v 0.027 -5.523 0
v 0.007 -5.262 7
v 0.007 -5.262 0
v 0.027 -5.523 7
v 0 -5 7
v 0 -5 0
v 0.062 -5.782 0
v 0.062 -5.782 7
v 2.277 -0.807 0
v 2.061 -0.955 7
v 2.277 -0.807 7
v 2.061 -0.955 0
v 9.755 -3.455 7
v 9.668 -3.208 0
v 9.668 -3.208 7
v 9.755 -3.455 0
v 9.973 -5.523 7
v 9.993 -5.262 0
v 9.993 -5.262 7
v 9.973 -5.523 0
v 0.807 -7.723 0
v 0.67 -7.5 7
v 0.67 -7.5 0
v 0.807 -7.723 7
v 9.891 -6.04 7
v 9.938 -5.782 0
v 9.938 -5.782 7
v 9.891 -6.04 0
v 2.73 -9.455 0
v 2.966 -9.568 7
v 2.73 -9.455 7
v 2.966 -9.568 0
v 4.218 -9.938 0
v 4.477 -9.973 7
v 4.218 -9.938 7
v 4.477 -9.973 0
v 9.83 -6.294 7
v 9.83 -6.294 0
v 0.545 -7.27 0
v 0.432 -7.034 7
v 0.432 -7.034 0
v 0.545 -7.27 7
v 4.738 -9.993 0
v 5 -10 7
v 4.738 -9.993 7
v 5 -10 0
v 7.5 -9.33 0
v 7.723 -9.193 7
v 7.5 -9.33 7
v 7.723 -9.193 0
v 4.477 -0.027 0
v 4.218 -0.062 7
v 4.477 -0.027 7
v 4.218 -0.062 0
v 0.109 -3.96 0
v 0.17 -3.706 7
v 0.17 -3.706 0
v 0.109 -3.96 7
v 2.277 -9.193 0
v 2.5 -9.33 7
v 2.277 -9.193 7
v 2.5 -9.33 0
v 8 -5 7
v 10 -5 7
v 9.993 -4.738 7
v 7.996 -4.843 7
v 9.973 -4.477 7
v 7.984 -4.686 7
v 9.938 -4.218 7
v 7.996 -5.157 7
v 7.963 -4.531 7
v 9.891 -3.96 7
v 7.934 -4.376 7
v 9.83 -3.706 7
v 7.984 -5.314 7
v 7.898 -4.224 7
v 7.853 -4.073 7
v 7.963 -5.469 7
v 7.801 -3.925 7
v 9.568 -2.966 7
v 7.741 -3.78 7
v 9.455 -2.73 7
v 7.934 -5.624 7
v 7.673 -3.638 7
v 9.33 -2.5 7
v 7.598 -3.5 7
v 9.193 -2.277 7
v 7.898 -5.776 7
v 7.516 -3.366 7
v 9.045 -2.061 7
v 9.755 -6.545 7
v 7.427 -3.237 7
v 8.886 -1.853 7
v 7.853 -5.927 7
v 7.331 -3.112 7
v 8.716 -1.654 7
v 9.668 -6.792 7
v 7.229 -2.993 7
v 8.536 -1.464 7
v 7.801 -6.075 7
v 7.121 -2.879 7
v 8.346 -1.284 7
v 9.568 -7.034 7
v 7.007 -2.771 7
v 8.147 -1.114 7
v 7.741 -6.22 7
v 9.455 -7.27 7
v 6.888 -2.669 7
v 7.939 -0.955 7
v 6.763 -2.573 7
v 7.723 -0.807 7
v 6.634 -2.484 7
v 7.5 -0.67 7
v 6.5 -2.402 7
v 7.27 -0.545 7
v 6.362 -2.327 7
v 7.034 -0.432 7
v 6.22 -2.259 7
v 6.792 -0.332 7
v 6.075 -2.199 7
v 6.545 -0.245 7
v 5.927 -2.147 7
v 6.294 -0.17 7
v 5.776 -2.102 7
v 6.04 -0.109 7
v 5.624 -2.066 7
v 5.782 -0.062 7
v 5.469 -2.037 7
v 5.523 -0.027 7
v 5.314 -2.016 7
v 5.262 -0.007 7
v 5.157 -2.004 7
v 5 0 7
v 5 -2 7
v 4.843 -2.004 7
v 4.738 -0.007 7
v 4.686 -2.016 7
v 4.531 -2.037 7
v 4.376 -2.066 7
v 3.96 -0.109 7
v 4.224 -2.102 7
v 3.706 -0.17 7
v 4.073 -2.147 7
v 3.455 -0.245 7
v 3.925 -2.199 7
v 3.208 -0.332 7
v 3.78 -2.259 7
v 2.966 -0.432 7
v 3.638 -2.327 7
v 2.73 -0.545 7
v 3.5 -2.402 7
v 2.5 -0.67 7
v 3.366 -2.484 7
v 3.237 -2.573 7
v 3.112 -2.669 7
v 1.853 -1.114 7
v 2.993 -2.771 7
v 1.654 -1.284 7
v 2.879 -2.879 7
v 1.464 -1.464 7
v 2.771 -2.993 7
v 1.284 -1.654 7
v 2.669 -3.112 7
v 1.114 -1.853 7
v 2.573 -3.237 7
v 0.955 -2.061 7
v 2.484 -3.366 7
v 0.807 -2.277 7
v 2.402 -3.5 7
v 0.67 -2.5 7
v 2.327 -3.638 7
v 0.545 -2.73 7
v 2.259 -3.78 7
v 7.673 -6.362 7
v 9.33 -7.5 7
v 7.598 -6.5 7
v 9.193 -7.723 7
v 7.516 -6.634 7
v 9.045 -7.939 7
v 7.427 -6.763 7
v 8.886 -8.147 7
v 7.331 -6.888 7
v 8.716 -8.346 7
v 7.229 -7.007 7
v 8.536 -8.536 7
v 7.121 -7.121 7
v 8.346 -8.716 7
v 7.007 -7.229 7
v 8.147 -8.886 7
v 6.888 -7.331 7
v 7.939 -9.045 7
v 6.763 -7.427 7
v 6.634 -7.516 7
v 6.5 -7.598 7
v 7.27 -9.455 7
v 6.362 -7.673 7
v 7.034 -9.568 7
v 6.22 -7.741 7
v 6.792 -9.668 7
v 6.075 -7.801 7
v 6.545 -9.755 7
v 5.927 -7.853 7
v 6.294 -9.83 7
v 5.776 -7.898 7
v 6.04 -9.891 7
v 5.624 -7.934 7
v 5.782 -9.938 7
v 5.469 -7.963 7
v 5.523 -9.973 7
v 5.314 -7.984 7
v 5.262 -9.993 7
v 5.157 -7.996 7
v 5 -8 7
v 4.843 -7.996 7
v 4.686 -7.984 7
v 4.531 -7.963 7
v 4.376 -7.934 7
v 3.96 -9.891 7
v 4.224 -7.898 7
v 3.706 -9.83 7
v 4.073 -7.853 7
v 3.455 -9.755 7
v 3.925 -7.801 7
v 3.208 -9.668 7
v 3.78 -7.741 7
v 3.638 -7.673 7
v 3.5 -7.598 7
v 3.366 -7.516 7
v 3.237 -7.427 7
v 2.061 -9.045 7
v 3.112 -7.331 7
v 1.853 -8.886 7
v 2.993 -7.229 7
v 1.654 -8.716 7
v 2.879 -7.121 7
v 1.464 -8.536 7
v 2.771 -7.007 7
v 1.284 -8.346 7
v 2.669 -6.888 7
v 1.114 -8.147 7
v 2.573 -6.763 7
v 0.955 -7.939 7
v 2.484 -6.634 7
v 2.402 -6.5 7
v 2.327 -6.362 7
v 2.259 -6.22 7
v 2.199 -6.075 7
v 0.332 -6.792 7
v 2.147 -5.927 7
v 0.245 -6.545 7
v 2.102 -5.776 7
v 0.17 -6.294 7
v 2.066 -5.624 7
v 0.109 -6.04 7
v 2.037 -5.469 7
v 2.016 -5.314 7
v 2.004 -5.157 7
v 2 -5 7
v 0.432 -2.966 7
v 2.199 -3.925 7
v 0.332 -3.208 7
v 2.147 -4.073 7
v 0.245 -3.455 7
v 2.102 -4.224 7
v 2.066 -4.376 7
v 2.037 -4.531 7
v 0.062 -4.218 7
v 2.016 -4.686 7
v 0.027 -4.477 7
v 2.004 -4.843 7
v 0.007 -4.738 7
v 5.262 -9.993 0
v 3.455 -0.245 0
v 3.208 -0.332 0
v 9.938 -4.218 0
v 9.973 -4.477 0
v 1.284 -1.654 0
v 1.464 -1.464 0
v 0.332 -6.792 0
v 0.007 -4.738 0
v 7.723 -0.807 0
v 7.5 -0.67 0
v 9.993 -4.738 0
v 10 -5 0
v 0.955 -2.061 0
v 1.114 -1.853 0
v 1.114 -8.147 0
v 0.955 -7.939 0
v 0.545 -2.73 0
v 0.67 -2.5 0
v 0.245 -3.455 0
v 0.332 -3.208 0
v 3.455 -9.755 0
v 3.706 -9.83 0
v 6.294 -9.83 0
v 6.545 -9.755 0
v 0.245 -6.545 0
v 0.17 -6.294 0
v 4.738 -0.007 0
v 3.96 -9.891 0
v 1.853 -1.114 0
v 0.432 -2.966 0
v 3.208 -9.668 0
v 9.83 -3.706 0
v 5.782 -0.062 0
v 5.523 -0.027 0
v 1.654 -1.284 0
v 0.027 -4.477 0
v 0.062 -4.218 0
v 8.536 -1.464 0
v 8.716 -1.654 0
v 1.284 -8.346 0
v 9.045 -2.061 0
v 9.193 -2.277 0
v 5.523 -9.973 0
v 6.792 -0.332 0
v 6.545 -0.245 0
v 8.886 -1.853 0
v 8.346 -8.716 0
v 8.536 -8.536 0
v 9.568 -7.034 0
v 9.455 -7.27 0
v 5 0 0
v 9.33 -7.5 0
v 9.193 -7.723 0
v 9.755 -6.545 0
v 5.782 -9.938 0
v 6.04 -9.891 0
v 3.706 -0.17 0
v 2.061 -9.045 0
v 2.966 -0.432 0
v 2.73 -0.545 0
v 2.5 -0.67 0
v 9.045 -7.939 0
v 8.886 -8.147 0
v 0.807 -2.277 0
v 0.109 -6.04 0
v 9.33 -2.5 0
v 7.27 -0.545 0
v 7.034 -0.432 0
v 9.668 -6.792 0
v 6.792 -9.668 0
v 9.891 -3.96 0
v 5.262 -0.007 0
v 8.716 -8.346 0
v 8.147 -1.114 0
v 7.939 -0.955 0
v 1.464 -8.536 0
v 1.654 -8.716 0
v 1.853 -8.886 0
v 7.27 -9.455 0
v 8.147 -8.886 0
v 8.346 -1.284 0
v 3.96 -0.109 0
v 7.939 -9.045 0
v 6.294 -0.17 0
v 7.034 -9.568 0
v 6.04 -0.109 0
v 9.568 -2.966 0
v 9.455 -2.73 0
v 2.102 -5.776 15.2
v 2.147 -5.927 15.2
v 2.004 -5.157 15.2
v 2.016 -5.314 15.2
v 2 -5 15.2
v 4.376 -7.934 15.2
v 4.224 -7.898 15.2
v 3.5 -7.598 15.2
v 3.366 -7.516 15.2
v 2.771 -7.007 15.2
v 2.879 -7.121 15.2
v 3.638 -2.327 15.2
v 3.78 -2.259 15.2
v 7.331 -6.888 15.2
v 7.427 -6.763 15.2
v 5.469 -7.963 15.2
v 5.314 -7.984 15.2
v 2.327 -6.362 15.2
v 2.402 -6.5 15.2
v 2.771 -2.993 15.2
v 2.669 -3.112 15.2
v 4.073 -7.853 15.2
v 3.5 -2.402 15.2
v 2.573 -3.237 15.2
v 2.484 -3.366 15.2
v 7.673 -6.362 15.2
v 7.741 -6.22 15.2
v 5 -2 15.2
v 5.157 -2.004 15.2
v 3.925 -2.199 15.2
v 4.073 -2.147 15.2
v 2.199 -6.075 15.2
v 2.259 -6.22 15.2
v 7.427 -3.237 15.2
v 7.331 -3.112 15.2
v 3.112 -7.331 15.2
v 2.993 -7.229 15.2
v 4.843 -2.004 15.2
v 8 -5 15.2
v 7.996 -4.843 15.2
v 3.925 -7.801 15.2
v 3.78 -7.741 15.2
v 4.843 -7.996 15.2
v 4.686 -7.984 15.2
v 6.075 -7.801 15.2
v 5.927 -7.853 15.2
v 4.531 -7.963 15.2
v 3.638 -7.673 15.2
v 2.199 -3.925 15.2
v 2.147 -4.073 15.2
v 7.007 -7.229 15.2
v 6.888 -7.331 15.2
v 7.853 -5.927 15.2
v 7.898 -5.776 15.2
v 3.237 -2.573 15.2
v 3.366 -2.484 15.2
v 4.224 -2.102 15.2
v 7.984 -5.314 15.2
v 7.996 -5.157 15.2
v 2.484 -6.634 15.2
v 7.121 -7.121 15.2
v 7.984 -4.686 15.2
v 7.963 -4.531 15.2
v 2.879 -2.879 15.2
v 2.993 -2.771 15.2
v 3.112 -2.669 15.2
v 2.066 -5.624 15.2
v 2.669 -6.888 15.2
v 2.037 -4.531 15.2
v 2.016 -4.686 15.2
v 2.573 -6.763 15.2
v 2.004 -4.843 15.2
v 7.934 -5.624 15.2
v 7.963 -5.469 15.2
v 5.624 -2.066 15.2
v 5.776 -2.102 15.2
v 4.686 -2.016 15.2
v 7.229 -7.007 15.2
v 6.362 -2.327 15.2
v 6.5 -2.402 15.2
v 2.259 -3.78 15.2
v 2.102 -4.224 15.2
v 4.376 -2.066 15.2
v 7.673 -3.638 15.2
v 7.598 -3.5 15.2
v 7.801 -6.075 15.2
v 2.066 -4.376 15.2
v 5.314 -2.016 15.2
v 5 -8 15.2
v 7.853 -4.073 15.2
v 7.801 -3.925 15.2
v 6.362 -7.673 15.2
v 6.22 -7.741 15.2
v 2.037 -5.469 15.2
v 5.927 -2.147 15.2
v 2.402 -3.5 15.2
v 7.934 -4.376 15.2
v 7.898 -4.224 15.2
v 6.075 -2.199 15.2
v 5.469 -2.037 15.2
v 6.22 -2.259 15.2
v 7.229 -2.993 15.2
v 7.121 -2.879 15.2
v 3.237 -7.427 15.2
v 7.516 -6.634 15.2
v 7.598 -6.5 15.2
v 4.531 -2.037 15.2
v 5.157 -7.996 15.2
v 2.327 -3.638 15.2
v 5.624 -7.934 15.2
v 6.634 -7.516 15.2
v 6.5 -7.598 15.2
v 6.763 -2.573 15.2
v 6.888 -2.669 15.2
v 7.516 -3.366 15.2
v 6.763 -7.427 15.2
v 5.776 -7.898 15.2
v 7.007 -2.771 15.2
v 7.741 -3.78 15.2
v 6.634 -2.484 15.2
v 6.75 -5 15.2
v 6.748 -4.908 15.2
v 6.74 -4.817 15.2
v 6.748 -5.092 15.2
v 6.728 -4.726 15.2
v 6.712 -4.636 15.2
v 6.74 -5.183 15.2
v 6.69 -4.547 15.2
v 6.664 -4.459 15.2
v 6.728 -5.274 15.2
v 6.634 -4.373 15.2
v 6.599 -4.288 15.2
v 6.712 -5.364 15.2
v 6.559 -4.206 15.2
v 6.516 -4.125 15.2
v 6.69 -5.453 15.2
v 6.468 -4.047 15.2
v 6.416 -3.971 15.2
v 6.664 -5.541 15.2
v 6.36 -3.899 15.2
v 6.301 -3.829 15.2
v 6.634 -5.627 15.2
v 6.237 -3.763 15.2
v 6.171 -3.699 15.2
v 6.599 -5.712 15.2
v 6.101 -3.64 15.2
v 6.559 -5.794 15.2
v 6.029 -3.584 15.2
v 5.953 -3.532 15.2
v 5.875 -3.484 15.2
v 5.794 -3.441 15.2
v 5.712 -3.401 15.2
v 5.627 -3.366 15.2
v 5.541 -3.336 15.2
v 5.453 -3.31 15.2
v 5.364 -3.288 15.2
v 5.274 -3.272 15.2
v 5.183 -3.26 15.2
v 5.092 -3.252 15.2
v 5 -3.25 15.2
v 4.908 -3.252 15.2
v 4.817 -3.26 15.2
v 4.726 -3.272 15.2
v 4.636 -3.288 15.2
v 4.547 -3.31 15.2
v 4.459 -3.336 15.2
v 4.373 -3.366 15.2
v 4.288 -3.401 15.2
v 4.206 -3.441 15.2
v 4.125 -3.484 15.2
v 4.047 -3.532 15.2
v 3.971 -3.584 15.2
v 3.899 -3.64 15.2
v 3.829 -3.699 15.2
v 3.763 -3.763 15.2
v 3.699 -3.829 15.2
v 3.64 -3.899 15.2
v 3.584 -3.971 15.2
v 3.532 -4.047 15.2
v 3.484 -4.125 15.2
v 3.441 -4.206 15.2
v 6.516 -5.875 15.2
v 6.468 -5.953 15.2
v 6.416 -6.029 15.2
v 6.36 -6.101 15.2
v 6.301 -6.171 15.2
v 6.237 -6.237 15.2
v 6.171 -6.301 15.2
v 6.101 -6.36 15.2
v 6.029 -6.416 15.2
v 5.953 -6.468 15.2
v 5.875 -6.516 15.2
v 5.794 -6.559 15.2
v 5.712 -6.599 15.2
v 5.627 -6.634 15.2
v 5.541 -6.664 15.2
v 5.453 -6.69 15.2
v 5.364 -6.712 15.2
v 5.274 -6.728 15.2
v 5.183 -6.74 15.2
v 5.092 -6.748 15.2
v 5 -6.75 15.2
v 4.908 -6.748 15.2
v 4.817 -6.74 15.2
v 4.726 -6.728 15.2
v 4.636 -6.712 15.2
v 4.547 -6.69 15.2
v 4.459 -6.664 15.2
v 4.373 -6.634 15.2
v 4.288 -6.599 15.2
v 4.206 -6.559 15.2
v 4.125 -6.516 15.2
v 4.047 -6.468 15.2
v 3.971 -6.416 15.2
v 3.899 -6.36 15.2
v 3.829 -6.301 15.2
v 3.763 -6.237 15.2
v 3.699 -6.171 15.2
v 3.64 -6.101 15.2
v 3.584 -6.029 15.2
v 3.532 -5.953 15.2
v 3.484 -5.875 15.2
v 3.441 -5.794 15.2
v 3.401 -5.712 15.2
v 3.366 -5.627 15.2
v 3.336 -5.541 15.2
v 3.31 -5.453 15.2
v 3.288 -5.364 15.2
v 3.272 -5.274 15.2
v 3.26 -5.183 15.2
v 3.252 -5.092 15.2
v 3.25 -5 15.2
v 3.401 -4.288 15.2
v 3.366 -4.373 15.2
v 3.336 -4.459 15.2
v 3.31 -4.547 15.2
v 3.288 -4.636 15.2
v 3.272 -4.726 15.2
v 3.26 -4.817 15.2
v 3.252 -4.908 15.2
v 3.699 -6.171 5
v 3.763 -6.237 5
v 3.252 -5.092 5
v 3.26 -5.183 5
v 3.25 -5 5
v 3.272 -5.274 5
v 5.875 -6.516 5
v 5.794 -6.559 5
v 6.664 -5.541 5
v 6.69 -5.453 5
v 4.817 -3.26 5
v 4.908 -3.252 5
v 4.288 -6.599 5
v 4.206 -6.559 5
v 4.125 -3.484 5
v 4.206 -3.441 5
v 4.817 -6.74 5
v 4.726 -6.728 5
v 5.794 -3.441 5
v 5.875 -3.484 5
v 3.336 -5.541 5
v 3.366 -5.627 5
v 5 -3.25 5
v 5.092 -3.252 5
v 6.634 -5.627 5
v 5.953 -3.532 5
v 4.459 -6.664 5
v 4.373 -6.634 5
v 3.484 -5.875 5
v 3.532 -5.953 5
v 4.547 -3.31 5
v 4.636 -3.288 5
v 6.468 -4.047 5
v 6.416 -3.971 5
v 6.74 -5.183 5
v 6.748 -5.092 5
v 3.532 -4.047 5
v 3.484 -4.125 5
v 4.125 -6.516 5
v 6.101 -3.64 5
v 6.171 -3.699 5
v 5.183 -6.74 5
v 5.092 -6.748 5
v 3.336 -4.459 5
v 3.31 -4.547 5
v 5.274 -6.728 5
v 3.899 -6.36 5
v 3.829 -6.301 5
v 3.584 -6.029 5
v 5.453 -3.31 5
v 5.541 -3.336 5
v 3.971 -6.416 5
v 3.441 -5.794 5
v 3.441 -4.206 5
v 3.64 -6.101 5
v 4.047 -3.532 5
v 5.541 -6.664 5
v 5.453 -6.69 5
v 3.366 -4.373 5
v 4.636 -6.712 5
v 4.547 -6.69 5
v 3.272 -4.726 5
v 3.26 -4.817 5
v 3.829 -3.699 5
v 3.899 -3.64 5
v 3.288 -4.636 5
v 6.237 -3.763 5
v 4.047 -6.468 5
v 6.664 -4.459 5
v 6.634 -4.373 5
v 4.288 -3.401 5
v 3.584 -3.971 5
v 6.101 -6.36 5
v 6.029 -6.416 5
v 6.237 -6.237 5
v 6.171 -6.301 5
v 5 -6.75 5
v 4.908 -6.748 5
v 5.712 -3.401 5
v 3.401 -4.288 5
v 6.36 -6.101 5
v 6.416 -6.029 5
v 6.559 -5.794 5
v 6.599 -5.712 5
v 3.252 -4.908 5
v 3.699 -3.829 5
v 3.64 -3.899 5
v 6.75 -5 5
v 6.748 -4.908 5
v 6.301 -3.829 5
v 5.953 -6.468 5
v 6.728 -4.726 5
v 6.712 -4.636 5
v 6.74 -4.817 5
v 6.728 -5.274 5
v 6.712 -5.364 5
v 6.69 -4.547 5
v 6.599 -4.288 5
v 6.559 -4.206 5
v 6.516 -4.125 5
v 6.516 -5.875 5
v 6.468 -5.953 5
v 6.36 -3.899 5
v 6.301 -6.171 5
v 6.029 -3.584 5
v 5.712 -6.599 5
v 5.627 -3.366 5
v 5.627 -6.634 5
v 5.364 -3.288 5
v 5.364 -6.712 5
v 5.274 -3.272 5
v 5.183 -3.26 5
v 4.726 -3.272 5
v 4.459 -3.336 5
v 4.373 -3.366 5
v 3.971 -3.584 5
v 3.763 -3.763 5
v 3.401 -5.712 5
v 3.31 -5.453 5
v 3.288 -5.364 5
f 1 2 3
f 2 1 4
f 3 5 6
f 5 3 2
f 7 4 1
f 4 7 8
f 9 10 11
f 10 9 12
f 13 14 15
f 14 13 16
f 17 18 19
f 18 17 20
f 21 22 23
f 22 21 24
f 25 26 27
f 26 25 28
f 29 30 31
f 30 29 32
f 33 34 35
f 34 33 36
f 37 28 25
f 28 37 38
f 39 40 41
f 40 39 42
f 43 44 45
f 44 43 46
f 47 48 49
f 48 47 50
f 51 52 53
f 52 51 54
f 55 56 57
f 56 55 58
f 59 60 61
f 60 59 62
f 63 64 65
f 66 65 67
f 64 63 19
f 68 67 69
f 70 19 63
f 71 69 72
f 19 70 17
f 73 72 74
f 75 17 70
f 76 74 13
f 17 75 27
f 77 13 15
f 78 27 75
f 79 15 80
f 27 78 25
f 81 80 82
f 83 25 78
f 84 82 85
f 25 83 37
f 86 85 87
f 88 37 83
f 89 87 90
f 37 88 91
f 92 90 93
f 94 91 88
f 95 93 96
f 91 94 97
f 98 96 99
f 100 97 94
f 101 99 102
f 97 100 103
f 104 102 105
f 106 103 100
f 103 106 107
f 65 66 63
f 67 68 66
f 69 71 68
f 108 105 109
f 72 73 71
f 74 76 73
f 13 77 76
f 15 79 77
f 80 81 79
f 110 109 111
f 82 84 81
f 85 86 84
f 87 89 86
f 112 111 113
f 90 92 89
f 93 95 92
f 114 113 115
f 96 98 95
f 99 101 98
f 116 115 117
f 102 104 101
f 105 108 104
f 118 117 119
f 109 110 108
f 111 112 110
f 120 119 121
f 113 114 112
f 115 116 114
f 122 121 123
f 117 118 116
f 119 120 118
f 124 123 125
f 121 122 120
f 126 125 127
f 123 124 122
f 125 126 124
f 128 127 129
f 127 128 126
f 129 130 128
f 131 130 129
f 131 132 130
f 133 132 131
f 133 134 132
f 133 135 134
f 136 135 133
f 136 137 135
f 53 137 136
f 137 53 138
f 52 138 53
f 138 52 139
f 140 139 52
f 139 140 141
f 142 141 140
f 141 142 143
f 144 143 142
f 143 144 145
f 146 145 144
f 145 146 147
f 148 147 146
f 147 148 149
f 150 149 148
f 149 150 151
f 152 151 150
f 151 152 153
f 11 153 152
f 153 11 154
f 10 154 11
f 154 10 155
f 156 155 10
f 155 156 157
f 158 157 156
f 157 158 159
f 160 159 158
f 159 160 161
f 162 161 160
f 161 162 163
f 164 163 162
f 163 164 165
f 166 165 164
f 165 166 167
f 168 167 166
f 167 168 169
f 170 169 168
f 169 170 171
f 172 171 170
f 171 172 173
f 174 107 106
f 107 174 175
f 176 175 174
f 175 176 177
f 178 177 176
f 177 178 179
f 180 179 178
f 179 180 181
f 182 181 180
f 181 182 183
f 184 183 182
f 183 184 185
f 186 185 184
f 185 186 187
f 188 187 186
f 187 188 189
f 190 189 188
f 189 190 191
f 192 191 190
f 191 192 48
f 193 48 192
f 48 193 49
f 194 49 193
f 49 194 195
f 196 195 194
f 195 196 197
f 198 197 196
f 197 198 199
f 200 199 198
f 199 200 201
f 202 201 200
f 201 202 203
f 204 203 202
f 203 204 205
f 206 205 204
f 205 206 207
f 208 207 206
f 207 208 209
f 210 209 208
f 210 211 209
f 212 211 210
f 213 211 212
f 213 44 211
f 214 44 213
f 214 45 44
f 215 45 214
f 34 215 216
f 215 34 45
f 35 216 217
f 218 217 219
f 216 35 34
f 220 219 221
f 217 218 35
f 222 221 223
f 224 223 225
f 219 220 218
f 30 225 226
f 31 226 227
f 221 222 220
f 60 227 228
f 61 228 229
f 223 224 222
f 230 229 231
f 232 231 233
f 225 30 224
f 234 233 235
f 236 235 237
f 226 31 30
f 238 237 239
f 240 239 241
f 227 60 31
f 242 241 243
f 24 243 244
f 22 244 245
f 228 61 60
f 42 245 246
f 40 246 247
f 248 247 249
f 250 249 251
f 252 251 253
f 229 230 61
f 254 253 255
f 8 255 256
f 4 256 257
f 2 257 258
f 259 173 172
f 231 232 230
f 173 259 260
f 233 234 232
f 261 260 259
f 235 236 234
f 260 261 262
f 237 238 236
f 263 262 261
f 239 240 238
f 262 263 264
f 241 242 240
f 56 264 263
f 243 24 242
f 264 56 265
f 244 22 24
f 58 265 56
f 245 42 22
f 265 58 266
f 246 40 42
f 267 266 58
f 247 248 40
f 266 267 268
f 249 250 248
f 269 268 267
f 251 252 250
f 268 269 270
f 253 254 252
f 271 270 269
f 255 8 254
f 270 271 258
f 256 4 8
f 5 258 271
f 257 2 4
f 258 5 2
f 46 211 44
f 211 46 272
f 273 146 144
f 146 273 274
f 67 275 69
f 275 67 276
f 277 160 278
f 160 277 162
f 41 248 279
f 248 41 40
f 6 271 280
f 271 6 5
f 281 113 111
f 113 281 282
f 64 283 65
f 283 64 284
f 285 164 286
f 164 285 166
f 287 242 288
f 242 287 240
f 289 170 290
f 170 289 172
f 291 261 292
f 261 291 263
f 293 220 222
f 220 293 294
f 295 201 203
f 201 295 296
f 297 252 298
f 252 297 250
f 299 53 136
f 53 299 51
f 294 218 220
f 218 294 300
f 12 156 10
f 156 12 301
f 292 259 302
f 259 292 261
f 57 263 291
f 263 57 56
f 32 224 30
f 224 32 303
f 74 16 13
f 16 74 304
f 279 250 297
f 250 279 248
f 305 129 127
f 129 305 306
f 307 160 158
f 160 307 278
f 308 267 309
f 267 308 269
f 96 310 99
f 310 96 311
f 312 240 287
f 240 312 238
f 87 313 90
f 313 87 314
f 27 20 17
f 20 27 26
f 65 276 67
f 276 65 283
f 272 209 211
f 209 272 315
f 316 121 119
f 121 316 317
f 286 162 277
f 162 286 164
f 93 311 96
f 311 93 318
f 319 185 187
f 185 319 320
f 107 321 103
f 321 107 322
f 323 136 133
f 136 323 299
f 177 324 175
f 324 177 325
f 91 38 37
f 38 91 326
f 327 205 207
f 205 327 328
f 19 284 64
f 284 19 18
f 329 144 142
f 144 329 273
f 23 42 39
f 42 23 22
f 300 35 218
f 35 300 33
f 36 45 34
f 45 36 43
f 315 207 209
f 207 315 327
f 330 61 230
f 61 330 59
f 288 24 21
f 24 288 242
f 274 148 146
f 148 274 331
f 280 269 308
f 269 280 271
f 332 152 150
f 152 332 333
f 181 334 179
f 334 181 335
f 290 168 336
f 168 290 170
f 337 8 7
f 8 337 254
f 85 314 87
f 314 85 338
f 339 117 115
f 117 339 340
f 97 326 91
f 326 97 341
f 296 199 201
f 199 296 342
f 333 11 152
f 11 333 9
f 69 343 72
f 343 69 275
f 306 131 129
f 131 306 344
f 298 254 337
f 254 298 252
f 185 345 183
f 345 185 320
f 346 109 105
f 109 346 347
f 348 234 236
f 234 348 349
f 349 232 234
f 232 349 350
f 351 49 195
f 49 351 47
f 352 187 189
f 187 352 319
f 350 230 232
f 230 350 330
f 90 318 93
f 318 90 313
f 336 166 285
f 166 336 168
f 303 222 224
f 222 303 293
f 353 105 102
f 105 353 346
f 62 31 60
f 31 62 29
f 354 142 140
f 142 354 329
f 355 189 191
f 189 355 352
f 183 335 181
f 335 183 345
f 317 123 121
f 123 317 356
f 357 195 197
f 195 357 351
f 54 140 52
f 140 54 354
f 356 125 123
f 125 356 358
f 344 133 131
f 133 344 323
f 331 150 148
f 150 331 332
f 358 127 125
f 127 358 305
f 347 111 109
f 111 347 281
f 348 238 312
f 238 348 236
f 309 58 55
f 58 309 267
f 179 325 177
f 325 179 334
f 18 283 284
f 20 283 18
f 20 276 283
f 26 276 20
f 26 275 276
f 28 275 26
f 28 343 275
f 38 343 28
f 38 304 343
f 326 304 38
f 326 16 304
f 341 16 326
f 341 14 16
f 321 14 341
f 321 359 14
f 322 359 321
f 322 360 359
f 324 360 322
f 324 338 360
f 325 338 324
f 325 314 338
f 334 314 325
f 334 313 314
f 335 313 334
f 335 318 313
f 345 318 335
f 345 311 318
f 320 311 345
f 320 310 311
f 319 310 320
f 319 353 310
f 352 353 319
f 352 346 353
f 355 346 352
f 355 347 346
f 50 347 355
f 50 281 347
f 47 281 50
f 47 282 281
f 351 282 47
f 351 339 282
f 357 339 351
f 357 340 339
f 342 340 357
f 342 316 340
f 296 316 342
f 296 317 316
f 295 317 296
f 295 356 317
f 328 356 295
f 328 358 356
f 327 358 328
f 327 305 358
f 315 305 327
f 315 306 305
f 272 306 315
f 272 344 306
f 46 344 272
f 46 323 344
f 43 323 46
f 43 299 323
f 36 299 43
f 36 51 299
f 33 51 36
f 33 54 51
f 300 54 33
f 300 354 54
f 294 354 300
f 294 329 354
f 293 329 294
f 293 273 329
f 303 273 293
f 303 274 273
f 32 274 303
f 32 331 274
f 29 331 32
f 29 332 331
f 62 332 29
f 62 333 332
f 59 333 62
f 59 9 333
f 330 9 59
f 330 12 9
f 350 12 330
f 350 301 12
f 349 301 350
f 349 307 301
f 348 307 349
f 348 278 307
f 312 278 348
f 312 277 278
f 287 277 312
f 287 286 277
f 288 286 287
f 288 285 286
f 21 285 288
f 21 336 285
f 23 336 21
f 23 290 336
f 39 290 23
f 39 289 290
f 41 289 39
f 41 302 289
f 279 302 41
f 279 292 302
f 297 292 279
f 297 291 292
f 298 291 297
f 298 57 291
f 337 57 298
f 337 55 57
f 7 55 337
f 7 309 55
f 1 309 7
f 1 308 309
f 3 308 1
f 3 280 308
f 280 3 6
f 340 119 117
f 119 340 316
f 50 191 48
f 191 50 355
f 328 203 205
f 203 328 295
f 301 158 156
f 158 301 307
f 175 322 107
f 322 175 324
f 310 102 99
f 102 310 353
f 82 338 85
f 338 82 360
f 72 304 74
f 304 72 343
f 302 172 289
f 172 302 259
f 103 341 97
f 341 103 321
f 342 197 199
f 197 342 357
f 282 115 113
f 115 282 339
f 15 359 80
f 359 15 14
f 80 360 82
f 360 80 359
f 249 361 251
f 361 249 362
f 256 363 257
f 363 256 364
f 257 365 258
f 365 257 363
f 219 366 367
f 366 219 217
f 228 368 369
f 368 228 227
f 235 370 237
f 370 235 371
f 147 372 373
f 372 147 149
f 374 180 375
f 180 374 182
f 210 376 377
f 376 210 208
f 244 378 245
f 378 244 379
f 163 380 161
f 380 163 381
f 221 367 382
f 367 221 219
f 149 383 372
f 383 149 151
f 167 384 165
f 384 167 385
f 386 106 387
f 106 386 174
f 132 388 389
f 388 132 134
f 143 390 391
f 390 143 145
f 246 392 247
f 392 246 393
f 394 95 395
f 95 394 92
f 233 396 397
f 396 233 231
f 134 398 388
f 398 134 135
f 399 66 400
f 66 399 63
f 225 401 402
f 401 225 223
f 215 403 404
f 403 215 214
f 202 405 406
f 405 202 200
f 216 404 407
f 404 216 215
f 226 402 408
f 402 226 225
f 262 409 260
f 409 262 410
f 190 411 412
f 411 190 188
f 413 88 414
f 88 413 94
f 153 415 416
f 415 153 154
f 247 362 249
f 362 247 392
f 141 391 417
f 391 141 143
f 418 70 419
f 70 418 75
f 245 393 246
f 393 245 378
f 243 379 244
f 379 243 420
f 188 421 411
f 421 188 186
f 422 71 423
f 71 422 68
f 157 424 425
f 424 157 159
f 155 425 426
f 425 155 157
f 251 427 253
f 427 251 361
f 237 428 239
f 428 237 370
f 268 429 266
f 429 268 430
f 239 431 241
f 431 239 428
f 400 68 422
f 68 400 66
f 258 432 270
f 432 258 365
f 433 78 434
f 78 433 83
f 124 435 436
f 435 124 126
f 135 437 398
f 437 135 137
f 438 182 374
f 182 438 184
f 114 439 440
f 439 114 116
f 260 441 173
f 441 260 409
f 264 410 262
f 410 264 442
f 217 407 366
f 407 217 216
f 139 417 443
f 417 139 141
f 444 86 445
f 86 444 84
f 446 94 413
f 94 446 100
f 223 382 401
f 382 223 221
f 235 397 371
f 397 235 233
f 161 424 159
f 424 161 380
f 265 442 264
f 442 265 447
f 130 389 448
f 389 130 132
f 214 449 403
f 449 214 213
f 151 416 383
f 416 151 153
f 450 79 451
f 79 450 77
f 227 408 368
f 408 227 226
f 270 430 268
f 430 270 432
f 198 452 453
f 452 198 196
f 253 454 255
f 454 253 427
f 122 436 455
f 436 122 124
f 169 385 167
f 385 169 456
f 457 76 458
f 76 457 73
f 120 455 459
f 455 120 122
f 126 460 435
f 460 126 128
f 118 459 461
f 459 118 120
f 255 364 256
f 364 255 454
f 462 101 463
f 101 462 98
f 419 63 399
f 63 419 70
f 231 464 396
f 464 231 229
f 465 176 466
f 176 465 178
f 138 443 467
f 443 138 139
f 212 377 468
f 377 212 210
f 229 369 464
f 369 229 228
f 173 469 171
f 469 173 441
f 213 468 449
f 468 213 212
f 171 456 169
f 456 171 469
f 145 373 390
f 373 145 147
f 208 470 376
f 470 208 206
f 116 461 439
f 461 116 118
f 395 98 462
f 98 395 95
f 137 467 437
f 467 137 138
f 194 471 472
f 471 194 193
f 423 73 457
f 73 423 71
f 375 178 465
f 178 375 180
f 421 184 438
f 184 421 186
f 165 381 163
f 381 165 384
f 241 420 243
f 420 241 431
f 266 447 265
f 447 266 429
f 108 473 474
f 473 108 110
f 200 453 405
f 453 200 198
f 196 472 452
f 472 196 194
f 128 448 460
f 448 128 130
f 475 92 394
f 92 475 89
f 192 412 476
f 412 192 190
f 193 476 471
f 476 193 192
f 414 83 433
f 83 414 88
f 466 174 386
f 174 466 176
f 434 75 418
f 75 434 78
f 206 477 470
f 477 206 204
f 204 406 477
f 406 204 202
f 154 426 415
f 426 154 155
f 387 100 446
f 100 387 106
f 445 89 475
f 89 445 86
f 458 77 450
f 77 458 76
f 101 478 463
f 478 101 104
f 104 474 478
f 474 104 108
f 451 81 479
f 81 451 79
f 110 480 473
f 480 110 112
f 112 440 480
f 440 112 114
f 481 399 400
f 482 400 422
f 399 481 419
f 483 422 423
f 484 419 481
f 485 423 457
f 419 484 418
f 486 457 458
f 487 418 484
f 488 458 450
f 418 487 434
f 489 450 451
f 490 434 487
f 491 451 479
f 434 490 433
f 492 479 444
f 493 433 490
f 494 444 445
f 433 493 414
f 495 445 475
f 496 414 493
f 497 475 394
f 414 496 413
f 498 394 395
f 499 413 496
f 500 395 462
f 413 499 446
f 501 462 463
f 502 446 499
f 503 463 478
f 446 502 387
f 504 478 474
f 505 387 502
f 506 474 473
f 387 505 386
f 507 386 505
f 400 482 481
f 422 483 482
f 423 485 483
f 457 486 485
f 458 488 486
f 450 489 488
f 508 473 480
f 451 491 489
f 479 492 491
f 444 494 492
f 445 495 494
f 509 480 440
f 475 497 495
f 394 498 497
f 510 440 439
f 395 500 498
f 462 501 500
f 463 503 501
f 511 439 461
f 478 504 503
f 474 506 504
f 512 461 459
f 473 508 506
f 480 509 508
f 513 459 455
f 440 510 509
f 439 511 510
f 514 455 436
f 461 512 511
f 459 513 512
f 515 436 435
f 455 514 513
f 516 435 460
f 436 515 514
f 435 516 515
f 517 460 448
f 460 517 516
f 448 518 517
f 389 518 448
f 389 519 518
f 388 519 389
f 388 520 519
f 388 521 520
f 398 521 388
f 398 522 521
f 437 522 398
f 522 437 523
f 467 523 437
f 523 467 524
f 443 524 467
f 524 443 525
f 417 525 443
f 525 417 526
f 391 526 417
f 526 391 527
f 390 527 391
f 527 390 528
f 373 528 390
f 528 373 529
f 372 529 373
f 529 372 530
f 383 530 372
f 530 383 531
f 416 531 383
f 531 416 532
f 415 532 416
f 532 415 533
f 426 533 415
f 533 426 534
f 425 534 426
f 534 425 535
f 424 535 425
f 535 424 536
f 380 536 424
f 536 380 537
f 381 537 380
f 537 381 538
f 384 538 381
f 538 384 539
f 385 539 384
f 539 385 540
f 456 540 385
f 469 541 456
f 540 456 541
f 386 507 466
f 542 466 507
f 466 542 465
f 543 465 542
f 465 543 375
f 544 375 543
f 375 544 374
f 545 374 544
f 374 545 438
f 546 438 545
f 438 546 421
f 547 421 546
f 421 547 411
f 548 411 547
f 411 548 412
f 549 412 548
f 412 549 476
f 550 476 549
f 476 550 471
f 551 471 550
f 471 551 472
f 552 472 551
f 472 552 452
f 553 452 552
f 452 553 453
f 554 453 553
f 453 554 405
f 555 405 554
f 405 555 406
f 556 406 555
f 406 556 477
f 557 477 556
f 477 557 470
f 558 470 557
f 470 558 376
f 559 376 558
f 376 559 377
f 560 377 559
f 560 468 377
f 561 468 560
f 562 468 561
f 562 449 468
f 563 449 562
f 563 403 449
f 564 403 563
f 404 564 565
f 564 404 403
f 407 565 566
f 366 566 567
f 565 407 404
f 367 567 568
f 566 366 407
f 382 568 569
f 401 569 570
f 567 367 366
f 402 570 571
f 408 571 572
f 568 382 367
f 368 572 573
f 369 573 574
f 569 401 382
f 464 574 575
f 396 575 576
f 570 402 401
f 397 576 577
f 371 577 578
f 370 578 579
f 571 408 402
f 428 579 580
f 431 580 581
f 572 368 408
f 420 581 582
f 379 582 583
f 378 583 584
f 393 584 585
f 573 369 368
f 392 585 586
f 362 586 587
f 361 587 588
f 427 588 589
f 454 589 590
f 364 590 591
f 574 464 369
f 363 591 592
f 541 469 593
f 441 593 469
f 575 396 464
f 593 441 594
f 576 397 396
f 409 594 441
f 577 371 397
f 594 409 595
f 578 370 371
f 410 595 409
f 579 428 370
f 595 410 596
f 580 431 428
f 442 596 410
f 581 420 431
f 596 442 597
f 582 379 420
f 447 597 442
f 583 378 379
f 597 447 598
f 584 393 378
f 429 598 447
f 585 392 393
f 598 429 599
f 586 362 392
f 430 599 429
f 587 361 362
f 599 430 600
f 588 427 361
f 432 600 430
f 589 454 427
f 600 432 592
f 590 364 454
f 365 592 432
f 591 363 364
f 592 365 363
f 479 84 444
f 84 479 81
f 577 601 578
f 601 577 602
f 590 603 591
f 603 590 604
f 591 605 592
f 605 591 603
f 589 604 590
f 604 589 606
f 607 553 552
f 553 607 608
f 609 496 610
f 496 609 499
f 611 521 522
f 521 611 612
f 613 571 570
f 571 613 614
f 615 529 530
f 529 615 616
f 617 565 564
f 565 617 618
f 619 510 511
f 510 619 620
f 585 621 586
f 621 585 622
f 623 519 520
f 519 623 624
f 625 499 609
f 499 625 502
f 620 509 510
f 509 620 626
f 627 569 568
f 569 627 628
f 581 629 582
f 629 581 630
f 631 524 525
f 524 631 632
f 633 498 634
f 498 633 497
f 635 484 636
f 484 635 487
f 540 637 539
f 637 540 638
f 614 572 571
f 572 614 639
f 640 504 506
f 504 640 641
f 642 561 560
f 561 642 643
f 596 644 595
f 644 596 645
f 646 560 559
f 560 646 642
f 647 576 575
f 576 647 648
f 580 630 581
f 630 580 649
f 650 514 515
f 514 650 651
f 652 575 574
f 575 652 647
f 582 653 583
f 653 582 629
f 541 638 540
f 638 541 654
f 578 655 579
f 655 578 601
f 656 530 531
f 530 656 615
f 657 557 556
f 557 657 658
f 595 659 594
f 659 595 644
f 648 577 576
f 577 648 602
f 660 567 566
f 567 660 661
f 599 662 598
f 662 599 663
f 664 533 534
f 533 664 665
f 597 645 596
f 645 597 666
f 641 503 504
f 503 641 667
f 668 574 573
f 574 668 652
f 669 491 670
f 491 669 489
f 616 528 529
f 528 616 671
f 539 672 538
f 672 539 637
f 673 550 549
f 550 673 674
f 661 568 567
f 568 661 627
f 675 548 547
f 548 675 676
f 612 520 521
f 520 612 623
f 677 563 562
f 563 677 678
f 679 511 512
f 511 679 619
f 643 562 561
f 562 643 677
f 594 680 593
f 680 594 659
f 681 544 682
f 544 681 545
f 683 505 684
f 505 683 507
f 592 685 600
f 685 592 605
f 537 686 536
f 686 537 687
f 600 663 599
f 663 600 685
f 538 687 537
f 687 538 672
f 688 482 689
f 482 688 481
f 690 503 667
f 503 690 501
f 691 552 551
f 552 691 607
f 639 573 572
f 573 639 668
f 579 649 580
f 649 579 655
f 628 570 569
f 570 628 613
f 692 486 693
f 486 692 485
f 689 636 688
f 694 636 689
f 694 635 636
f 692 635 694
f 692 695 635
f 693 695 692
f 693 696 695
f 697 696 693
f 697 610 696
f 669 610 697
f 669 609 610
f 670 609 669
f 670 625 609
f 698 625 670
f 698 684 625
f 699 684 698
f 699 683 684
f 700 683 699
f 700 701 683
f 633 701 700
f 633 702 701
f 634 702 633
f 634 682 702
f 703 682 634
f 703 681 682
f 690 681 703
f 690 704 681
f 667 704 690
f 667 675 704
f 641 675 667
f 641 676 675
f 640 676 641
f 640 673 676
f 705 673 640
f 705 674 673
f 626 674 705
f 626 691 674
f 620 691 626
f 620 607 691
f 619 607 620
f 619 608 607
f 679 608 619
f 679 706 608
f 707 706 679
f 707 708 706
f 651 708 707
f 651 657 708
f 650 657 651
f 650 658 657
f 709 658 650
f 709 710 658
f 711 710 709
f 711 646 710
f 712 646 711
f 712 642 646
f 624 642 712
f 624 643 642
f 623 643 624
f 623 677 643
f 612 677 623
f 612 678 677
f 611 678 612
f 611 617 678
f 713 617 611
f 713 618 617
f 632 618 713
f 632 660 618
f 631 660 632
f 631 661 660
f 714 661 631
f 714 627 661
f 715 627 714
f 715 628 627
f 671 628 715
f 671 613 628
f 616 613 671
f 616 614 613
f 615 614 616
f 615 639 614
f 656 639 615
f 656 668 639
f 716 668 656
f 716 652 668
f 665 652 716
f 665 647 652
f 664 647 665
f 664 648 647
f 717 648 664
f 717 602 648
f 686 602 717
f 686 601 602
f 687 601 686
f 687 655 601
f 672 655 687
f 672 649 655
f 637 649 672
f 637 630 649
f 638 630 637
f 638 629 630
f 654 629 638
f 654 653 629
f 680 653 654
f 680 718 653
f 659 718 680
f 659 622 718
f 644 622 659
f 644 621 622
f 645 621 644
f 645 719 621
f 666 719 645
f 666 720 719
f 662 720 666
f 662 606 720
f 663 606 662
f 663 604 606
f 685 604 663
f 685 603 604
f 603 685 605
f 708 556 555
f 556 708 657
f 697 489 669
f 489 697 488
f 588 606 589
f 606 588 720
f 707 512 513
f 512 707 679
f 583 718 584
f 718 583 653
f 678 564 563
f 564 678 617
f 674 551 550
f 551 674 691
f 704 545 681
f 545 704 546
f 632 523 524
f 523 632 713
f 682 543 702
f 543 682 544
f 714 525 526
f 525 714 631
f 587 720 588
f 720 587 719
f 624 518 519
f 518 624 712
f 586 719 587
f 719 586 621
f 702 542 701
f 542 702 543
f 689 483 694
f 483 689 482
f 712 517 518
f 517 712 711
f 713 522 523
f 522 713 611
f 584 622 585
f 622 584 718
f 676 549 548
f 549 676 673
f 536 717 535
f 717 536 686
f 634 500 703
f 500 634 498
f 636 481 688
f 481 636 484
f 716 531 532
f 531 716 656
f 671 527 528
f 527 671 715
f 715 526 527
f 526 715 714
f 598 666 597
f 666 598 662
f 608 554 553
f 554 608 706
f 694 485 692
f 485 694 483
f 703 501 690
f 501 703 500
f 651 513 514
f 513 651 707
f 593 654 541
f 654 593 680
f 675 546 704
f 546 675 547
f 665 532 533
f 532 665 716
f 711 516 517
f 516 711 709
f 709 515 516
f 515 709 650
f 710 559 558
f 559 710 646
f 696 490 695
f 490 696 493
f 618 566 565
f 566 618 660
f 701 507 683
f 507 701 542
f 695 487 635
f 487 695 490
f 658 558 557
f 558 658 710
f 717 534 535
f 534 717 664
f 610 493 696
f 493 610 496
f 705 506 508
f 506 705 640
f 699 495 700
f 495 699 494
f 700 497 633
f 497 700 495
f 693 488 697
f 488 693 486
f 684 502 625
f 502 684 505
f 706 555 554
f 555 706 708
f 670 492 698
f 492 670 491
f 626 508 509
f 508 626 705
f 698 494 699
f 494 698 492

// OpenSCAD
// file: spindlePlate.scad
include <./config.scad>
include <../../library/polyround.scad>

plateWidth = spindleDiameter * 10;
handleLength = spindleWheelDiameter + 150;
handleWidth = 60;


module plate() {
    // x, y, diameter
    radiiPoints= [
        [0, 0, 2],
        [0, plateWidth, 2],
        [plateWidth, plateWidth, 2],
        [plateWidth, 0, 2]
    ];

    linear_extrude(spindlePlateThickness)
    polygon(
      polyRound(radiiPoints,30)
    );
}

module lock() {
    difference() {
        hull() {
            cylinder(d = 10, h = spindleHandleThickness);

            translate([60, 0, 0])
            cylinder(d = 20, h = spindleHandleThickness);
        }
        translate([60, 0, -3])
        // pin hole
        cylinder(d = 6.2, h = 11.2);
    }
}

module drawSpindleLockTopProjection() {
    // // Draufsicht
    translate([70, -10, 0])
    projection() {
        rotate([0,0,180])
        lock();
    }
}

module spindleLockMeasuermentLinesLength() {
    color([0/255, 0/255, 0/255]) translate([0, 0, 0]) {

        square([lineThickness,lineGap * 2 + 20]);

        translate([10, 0, 0])
        square([lineThickness,lineGap + 20]);



        translate([10, -60, 0])
        square([lineThickness,lineGap + 20]);

        translate([75, 0, 0])
        square([lineThickness,lineGap * 2 + 20]);


        translate([-20, lineGap * 2, 0]) {
            length = 75 + 40;

            translate([40, 15, 0])
            text(size = textSize, str(75));

            square([length, lineThickness]);
        }


        translate([-20, lineGap, 0]) {
            length = 75 + 40;

            translate([40, 15, 0])
            text(size = textSize, str(65));

            translate([0, 15, 0])
            text(size = textSize, str(10));


            translate([10,-160, 0])
            text(size = textSize, str("Bohrung 6.2mm"));

            square([length, lineThickness]);
        }

    }
}


module spindleLockMeasuermentLinesWidth() {
    color([0/255, 0/255, 0/255]) translate([0, 0, 0]) {

        translate([0, -230, 0])
        square([lineThickness,lineGap + 20]);


        translate([5, 0, 0])
        square([lineThickness,lineGap + 20]);

        translate([15, 0, 0])
        square([lineThickness,lineGap + 20]);


        translate([20, -230, 0])
        square([lineThickness,lineGap + 20]);


        translate([-20, -210, 0]) {
            length = 20 + 40;

            translate([15, 15, 0])
            text(size = textSize, str(20));

            square([length, lineThickness]);
        }


        translate([-20, lineGap, 0]) {
            length = 20 + 40;

            translate([15, 15, 0])
            text(size = textSize, str(10));

            square([length, lineThickness]);
        }

    }
}


module pin() {
    translate([60, 0, -2]) {
        difference() {
            union() {
                translate([0, 0, -spindlePlateThickness]) cylinder(d = 10, h = spindlePlateGap + spindlePlateThickness);
                cylinder(d = 6, h = spindleHandleThickness + spindlePlateGap + 0.2);
            }
             cylinder(d = 3.5, h = 30);
        }
    }
}

module pinHole() {
    translate([60, 0, -4]) {
        difference() {
            union() {
                cylinder(d = 10, h = 20);
            }
        }
    }
}

module screwHoles(gap = 20) {
    translate([gap, gap, - spindlePlateThickness / 2])
    cylinder(h=spindlePlateThickness*2, d=8);

    translate([gap, plateWidth - gap, - spindlePlateThickness / 2])
    cylinder(h=spindlePlateThickness*2, d=8);

    translate([plateWidth - gap, plateWidth - gap, - spindlePlateThickness / 2])
    cylinder(h=spindlePlateThickness*2, d=8);

    translate([plateWidth - gap, gap, - spindlePlateThickness / 2])
    cylinder(h=spindlePlateThickness*2, d=8);
}

module spindleHole(gap = 20) {
    translate([plateWidth / 2, plateWidth / 2, - spindlePlateThickness / 2])
    cylinder(h=spindlePlateThickness*2, d=spindleDiameter + 2);
}

module onlySpindlePlate() {
    difference() {
        translate([-plateWidth/2, -plateWidth/2, 0])
        difference() {
            plate();
            screwHoles(15);
            spindleHole();

        }
        translate([50, 20, spindlePlateThickness + spindlePlateGap]) {
        rotate([0, 0, 70]) {
            translate([0, 0, -10]) pinHole();
        }}
    }
}

module spindlePlate() {

    onlySpindlePlate();

    translate([50, 20, spindlePlateThickness + spindlePlateGap]) {
        rotate([0, 0, 70]) {
            color([90/255, 50/255, 80/255]) lock();
            translate([0, 0, ]) pin();
        }
    }
}


module drawSpindlePlateTopProjection() {
    // // Draufsicht
    translate([plateWidth/2, -plateWidth/2, 0])
    projection() {
        rotate([0,0,90])
        onlySpindlePlate();
    }
}


module drawSpindlePlatePinSideProjection() {
    // // Draufsicht
    translate([-55, -8.2, 0])
    projection() {
        rotate([270,0,0])
        pin();
    }
}



module spindlePlatePinMeasuermentLinesWidth() {
    color([0/255, 0/255, 0/255]) translate([0, lineGap/4, 0]) {

        square([lineThickness,lineGap + 10]);



        translate([2, 0, 0])
        square([lineThickness,lineGap/2 + 10]);
        translate([8, 0, 0])
        square([lineThickness,lineGap/2 + 10]);


        translate([10, 0, 0])
        square([lineThickness,lineGap + 10]);






        translate([5, -lineGap - 35, 2])
        square([lineThickness,lineGap + 10]);




        translate([-10, -lineGap, 0]) {


            translate([11, -45, 0])
            text(size = textSize/2, str("Mittige Gewindebohrung M4"));


        }




        translate([-10, lineGap/2, 0]) {
            length = 10 + 20;

            translate([11, 15, 0])
            text(size = textSize/2, str(6));

            translate([-2, 15, 0])
            text(size = textSize/2, str(2));

            translate([24, 15, 0])
            text(size = textSize/2, str(2));


            square([length, lineThickness]);
        }



        translate([-10, lineGap, 0]) {
            length = 10 + 20;

            translate([6, 15, 0])
            text(size = textSize/2, str(10));


            square([length, lineThickness]);
        }


    }
}


module spindlePlatePinMeasuermentLinesHeight() {
    color([0/255, 0/255, 0/255]) translate([0, -lineGap*2.2, 0]) {

        square([lineThickness,lineGap + 10]);



        translate([spindleHandleThickness + 0.2, 0, 0])
        square([lineThickness,lineGap/2 + 10]);



        translate([spindlePlateThickness + spindlePlateGap + spindleHandleThickness + 0.2, 0, 0])
        square([lineThickness,lineGap + 10]);



        translate([-10, lineGap/2, 0]) {
            length = 10 + 20;

            translate([18, 15, 0])
            text(size = textSize/2, str(spindlePlateThickness + spindlePlateGap));

            translate([-10, 15, 0])
            text(size = textSize/2, str(spindleHandleThickness + 0.2));



            square([length, lineThickness]);
        }



        translate([-10, lineGap, 0]) {
            length = 10 + 20;

            translate([6, 15, 0])
            text(size = textSize/2, str(spindlePlateThickness + spindlePlateGap + spindleHandleThickness + 0.2));


            square([length, lineThickness]);
        }


    }
}


module spindlePlateMeasuermentLinesLength() {
    color([0/255, 0/255, 0/255]) translate([0, lineGap, 0]) {

        square([lineThickness,lineGap * 2 + 20]);


        translate([15, 0, 0])
        square([lineThickness,lineGap + 20]);



        translate([plateWidth-15, 0, 0])
        square([lineThickness,lineGap + 20]);


        translate([plateWidth, 0, 0])
        square([lineThickness,lineGap * 2 + 20]);

        //50, 20
        translate([23, -lineGap-30, 2])
        square([lineThickness,lineGap]);

        translate([0, -lineGap+10, 2])
        square([lineThickness,lineGap-40]);


        translate([plateWidth/2, -plateWidth - lineGap*2, 2])
        square([lineThickness,lineGap * 2 + 20]);


        translate([-20, -50, 0]) {
            length = 23 + 40;

            translate([15, 15, 0])
            text(size = textSize, str(23));


            translate([45, -20, 2])
            text(size = textSize, str("Bohrung 10.1mm"));

            square([length, lineThickness]);
        }



        translate([-20, lineGap * 2, 0]) {
            length = plateWidth + 40;

            translate([plateWidth/2, 15, 0])
            text(size = textSize, str(plateWidth));


            square([length, lineThickness]);



            translate([plateWidth/2, -plateWidth - lineGap*3 - plateWidth/2, 0])
            text(size = textSize, str("Mittige Bohrung 22mm"));

        }



        translate([-20, lineGap, 0]) {
            length = plateWidth + 40;

            translate([plateWidth/2, 15, 0])
            text(size = textSize, str(plateWidth - 15*2));


            translate([10, 15, 0])
            text(size = textSize, str(15));

            translate([plateWidth, 15, 0])
            text(size = textSize, str(15));

            translate([plateWidth + 40, 15, 0])
            text(size = textSize, str("Bohrungen Ecke 8mm"));


            square([length, lineThickness]);
        }


    }
}


module spindlePlateMeasuermentLinesWidth() {
    color([0/255, 0/255, 0/255]) translate([0, lineGap, 0]) {

        translate([0, 0, 0])
        square([lineThickness,lineGap * 2 + 20]);

        translate([15, 0, 0])
        square([lineThickness,lineGap + 20]);

        translate([plateWidth - 15, 0, 0])
        square([lineThickness,lineGap + 20]);



        translate([plateWidth, 0, 0])
        square([lineThickness,lineGap * 2 + 20]);


        translate([-20, lineGap * 2, 0]) {
            length = plateWidth + 40;

            translate([plateWidth/2, 15, 0])
            text(size = textSize, str(plateWidth));

            square([length, lineThickness]);
        }


        translate([-20, lineGap, 0]) {
            length = plateWidth + 40;

            translate([plateWidth/2, 15, 0])
            text(size = textSize, str(plateWidth - 15 * 2));


            translate([10, 15, 0])
            text(size = textSize, str(15));

            translate([plateWidth, 15, 0])
            text(size = textSize, str(15));

            square([length, lineThickness]);
        }




        //50, 20
        translate([29, -plateWidth-lineGap*2-20, 2])
        square([lineThickness,lineGap + 40]);

        translate([0, -plateWidth-lineGap*2-20, 2])
        square([lineThickness,lineGap]);

        translate([-20, -plateWidth-lineGap*2, 0]) {
            length = 23 + 40;

            translate([15, 15, 0])
            text(size = textSize, str(29));




            square([length, lineThickness]);
        }


    }
}
// file: config.scad
drawReferences = false;
drawReferenceWall = false;

outerWidth = 1500;
outerDepth = 700;
outerHeight = 700;

profileSize = 40;

fireBasketHeight = 250;
fireBasketWidth = 400;
fireBasketGroundClearance = 100;
fireBasketFrontOpen = true;

spindleDiameter  = 20;
spindleOverlength = 5;
spindleWallExtension = 140;
spindleWheelDiameter = 200;
spindlePlateThickness = 5;
spindlePlateGap = 2;
spindleHandleThickness = 8;

grateGap = 4;
grateSize = 30;
grateProfileThickness = 3;

lineThickness = 1;
lineGap = 80;
textSize = 20;

$fn = 120;
// main file
include <./config.scad>
include <./spindlePlate.scad>


color([200/255, 200/255, 100/255])
rotate([0, 0, 180])
translate([-65, 5, spindlePlateThickness + spindlePlateGap])
pin();
